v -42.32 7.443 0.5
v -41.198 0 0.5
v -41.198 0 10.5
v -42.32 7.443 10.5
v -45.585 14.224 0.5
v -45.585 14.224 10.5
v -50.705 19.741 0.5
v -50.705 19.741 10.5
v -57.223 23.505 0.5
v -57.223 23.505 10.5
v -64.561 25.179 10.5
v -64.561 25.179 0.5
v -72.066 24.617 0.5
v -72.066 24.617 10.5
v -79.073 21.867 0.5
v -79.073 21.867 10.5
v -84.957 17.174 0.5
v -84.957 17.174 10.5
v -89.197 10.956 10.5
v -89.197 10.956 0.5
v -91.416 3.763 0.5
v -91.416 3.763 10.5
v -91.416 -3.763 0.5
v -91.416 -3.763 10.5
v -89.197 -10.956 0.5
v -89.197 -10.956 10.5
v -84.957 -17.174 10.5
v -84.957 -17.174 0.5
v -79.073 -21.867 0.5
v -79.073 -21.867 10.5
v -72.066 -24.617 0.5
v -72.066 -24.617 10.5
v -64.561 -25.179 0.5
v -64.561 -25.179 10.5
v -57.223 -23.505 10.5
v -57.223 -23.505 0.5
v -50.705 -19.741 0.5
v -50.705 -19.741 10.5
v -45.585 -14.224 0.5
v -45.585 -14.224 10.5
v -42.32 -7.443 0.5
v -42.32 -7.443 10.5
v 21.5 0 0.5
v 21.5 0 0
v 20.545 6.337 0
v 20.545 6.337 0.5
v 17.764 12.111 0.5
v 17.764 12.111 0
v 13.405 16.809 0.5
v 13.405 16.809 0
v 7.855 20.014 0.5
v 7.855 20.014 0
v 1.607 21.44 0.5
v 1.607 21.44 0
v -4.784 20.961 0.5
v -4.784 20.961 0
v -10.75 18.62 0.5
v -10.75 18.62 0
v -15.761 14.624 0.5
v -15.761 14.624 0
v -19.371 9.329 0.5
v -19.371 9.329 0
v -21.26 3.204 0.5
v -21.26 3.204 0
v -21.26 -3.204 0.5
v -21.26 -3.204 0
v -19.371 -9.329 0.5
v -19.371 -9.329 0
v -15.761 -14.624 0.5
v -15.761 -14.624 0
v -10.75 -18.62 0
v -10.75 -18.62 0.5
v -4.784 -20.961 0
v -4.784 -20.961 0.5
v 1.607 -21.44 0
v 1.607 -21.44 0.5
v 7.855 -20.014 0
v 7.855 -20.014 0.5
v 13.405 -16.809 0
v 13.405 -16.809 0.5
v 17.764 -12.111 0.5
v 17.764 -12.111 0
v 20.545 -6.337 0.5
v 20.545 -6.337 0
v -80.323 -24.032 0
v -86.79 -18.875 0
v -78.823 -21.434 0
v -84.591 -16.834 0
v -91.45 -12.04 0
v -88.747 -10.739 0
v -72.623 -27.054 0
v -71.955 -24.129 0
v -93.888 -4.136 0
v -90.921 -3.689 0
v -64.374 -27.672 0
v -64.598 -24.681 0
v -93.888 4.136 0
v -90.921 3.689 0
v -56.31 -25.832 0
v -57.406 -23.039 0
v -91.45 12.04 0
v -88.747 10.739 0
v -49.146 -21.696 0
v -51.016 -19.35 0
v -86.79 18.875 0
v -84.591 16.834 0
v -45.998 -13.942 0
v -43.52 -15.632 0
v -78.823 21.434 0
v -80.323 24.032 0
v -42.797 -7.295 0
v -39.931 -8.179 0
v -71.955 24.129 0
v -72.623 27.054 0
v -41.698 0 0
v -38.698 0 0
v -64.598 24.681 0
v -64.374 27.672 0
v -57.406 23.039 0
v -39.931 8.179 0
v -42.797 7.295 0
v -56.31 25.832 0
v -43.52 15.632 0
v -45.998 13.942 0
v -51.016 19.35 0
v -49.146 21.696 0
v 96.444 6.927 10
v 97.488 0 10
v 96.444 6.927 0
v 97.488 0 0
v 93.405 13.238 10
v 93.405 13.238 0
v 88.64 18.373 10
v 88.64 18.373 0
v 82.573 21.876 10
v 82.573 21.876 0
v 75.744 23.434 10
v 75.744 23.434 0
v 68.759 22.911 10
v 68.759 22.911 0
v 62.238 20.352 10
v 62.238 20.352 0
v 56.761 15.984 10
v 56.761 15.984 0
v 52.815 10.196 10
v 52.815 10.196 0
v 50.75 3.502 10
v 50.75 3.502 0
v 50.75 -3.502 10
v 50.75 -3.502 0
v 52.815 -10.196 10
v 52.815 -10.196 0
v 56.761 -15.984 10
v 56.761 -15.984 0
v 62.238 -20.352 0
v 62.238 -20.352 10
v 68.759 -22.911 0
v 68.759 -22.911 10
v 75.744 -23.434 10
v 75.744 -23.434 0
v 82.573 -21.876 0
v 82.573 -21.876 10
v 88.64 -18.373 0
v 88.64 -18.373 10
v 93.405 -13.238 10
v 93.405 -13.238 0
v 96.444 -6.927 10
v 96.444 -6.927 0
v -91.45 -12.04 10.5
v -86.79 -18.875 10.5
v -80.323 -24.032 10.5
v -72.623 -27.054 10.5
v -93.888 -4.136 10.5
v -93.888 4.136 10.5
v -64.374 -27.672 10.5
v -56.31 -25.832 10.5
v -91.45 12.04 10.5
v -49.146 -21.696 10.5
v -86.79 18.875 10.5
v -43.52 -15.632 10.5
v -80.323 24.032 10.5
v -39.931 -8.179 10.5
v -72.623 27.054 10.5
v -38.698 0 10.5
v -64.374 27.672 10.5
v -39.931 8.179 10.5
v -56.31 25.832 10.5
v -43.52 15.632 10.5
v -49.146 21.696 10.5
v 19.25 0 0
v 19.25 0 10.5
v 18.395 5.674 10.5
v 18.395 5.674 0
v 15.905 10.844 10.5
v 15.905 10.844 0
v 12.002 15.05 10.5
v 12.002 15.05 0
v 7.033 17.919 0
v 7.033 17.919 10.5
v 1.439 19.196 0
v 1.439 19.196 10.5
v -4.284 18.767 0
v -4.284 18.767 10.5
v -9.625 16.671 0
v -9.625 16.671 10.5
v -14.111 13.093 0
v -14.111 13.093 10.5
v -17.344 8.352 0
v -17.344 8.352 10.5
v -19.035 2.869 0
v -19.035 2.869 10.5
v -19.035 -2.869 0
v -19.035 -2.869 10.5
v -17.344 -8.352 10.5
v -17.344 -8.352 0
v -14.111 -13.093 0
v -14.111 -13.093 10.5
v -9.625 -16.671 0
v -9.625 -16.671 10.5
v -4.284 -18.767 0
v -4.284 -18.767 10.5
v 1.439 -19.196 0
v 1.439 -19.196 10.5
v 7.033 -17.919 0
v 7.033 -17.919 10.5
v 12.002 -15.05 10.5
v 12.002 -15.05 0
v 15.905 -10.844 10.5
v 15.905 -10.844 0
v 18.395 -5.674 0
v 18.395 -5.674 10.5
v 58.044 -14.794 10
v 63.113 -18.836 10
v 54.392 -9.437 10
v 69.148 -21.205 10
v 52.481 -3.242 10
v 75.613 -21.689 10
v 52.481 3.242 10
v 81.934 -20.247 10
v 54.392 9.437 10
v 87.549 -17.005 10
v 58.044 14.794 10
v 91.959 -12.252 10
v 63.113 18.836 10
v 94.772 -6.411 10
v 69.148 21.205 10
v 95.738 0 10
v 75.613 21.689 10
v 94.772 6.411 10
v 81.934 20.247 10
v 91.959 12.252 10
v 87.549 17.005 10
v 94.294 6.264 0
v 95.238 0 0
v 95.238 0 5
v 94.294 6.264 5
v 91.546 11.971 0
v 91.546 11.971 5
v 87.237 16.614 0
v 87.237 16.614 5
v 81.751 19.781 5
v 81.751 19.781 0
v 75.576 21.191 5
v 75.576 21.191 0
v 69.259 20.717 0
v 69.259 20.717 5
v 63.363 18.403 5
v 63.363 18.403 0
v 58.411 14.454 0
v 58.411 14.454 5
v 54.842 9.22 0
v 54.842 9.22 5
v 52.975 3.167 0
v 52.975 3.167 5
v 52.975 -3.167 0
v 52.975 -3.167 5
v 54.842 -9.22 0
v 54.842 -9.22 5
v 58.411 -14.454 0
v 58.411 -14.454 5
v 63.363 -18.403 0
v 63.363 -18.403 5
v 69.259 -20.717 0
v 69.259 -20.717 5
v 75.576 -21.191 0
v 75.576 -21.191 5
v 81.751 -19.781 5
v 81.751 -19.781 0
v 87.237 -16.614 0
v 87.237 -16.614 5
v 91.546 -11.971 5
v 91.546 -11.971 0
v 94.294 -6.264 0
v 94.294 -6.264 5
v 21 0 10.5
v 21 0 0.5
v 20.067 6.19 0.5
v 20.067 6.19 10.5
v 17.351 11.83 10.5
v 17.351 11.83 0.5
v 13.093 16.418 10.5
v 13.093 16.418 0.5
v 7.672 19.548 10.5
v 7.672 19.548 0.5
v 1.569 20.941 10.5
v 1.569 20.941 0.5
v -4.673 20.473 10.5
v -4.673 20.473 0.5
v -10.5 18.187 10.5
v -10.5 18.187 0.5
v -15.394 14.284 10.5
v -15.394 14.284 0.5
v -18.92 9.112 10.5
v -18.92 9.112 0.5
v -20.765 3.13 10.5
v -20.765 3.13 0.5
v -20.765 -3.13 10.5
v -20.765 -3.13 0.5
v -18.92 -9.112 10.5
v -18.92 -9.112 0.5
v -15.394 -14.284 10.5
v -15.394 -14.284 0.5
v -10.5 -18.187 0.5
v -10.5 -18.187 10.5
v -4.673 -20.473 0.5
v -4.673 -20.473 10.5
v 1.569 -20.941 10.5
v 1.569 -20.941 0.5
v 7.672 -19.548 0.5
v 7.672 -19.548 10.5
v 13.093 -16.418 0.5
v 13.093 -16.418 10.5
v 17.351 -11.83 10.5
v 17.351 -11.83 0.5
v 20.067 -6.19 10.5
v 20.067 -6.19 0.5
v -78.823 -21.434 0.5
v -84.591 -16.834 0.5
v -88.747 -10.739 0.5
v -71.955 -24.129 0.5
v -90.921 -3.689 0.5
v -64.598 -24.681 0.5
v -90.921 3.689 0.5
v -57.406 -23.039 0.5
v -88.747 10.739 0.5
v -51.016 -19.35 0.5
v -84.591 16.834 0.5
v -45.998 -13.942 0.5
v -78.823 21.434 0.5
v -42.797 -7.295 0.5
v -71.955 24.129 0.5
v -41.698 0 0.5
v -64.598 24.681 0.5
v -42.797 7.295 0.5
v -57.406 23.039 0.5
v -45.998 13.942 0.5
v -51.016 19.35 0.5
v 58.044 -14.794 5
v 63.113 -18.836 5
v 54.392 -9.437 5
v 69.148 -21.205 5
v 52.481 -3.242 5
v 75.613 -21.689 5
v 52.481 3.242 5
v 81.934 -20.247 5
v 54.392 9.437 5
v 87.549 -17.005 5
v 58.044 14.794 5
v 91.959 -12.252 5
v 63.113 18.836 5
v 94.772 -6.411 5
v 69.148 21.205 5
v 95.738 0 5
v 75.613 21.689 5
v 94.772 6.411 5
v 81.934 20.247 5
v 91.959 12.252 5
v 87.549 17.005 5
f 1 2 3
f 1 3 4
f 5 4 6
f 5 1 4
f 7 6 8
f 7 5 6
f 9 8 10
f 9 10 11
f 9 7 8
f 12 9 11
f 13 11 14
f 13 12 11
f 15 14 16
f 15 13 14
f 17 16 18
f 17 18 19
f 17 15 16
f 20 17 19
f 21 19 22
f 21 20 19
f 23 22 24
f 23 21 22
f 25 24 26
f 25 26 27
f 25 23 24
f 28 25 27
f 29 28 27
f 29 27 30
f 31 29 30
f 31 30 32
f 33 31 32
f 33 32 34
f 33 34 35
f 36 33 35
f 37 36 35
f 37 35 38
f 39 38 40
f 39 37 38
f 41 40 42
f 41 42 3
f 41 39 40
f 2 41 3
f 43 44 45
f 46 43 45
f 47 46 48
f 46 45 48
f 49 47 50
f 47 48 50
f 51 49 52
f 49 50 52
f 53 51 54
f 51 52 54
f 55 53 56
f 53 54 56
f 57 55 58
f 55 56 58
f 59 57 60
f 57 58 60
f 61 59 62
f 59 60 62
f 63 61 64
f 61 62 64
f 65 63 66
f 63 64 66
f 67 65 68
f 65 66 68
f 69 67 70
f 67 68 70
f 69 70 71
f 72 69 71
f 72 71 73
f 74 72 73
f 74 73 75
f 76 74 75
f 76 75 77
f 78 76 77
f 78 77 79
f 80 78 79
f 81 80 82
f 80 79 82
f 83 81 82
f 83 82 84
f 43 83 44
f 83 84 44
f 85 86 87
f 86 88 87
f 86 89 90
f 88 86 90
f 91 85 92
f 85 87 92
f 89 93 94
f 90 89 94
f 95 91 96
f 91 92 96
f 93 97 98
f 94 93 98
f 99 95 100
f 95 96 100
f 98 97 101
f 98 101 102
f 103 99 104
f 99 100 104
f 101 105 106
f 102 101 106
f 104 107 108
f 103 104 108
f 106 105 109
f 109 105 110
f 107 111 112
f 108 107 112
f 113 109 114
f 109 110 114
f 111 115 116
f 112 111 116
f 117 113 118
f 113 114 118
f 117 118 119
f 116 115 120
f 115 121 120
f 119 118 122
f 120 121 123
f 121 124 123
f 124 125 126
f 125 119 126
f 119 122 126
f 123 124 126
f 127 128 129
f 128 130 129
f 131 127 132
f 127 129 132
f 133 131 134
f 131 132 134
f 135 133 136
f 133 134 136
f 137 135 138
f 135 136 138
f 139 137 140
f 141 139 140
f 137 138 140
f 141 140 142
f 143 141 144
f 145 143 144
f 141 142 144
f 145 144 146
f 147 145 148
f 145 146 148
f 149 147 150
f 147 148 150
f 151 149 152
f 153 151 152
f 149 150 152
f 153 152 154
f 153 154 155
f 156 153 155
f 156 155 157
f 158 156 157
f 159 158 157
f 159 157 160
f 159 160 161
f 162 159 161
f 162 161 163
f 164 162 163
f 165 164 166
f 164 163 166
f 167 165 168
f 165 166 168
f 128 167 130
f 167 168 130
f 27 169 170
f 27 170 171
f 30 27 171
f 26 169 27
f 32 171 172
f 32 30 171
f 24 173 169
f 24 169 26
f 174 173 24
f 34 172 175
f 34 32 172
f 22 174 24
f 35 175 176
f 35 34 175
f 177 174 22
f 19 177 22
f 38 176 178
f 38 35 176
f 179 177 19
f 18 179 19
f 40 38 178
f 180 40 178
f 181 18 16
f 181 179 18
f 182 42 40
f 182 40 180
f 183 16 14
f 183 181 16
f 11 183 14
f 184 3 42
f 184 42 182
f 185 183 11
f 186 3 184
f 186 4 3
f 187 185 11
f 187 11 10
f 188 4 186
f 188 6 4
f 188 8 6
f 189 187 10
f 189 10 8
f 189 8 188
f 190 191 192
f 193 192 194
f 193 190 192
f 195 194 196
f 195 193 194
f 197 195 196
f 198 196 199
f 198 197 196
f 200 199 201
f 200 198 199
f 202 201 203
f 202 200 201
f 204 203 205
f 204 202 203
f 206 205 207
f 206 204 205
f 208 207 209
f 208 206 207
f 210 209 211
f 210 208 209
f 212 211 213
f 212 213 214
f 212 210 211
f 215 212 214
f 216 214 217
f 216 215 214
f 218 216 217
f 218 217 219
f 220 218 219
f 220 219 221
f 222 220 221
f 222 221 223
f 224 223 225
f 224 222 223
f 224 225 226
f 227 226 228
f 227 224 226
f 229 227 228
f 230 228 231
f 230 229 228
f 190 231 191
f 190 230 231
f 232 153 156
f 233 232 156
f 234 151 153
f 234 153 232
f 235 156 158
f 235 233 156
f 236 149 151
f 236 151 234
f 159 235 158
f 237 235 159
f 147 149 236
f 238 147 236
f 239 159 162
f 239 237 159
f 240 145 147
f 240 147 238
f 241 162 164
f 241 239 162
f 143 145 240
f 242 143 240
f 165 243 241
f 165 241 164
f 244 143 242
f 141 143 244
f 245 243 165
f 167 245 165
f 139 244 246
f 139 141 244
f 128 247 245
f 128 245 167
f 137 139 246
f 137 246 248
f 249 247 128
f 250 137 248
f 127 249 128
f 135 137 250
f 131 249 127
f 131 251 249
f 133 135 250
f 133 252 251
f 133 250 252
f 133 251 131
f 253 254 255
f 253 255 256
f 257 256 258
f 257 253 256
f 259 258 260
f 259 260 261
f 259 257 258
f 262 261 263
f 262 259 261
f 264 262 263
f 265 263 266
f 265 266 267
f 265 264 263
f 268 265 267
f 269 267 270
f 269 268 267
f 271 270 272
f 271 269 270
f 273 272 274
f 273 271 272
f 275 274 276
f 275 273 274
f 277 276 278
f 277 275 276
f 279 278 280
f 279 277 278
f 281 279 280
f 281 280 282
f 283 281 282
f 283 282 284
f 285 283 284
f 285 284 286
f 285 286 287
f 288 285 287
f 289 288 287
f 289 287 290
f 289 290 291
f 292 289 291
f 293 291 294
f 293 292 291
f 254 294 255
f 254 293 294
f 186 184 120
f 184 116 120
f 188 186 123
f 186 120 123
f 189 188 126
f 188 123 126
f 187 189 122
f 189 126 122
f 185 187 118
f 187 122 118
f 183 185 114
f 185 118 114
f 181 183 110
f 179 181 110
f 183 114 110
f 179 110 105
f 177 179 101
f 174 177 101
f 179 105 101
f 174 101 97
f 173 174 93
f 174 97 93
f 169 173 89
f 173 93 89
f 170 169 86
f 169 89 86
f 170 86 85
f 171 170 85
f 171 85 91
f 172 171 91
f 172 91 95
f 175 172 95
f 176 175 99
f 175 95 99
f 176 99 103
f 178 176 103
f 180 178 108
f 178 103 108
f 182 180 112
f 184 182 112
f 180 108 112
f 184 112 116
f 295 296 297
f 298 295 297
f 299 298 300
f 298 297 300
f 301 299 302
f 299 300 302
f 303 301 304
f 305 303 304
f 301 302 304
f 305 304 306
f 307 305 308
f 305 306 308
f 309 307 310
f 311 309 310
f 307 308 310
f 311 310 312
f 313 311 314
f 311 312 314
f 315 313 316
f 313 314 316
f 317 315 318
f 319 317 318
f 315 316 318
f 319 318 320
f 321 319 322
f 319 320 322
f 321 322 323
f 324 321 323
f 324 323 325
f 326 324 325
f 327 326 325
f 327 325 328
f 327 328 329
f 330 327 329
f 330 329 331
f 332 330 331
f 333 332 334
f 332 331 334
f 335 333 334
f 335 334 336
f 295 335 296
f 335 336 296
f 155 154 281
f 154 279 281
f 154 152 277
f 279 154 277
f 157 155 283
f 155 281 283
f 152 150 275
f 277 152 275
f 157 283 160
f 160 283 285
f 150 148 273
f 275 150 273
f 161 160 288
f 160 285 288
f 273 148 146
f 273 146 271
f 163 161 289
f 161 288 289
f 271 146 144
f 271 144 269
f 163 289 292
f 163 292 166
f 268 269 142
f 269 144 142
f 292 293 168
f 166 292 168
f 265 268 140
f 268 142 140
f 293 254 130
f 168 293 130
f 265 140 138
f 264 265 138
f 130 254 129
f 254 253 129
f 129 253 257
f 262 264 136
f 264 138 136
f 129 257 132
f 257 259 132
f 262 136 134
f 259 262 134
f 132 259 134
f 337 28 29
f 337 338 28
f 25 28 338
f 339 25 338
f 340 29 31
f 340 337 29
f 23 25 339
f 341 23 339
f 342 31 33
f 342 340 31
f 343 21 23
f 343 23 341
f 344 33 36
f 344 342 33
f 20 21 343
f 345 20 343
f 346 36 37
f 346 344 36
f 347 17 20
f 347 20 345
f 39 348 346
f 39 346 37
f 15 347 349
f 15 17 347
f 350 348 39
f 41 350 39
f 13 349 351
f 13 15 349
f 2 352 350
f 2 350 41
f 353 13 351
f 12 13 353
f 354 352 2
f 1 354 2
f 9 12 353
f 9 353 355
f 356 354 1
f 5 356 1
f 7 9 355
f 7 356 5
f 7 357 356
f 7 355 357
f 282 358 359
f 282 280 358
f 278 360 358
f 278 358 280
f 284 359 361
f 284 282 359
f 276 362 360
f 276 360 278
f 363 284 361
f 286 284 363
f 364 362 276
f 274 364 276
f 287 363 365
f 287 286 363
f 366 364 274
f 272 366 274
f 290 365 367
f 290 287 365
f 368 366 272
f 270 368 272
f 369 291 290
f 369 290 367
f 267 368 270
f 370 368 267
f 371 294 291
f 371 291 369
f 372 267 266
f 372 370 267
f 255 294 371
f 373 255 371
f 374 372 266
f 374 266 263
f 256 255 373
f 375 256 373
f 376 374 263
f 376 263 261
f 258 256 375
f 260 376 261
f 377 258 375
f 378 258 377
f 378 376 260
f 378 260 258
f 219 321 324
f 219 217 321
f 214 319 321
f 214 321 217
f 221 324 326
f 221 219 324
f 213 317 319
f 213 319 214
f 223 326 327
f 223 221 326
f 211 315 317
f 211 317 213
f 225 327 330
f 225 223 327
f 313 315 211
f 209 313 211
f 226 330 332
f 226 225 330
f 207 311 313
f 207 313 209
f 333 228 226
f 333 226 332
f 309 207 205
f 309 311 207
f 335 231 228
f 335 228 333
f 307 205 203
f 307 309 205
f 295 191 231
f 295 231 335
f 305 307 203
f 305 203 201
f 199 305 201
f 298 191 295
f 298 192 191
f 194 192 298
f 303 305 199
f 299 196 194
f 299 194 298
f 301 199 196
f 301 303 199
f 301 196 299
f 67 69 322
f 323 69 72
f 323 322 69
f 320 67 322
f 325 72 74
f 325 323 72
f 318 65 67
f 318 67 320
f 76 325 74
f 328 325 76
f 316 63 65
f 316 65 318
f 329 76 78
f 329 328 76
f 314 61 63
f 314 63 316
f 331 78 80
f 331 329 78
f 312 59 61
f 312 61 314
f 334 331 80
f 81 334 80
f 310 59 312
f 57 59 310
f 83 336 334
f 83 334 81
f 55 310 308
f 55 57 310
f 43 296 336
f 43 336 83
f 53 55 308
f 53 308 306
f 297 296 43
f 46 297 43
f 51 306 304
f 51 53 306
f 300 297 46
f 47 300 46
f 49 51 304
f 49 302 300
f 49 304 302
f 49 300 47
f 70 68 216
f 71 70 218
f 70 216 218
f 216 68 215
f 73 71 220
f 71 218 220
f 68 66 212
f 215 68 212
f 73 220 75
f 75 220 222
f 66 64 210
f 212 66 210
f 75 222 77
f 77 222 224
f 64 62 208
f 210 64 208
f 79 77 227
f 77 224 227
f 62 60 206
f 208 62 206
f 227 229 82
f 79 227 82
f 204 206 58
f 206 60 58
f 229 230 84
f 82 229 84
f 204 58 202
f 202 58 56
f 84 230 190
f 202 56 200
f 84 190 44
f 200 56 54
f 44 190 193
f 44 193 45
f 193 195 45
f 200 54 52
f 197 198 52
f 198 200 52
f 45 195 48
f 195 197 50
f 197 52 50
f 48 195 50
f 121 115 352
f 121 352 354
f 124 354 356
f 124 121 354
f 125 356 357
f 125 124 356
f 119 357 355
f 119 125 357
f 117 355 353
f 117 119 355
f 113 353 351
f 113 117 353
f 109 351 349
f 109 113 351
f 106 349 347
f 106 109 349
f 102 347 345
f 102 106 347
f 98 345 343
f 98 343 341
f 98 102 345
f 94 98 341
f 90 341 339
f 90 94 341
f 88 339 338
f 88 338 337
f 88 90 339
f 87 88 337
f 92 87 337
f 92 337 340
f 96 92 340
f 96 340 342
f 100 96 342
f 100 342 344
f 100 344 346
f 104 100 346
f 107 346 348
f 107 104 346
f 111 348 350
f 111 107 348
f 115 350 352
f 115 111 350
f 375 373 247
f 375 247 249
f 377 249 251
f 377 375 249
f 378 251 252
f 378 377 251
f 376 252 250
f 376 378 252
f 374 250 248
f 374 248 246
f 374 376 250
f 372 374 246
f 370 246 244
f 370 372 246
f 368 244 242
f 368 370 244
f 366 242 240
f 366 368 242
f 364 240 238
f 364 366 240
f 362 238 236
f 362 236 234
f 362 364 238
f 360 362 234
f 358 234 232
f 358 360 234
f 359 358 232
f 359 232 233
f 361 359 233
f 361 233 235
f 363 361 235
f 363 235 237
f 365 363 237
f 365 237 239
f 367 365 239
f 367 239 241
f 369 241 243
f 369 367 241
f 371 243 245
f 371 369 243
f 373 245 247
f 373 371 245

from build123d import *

# Parameters (mm, degrees)
F0_R      = 21.5
F0_R_2    = 19.25
F1_DEPTH  = 0.5
F2_R      = 21
F2_R_2    = 19.25
F3_DEPTH  = 10
F4_R      = 23.5
F4_R_2    = 21.25
F5_DEPTH  = 5
F6_R      = 23.5
F6_R_2    = 21.75
F7_DEPTH  = 5
F8_R      = 27.75
F8_R_2    = 24.75
F9_DEPTH  = 0.5
F10_R     = 27.75
F10_R_2   = 25.25
F11_DEPTH = 10


with BuildPart() as f1:
    # F0 (on Top) → F1 (new body)
    with BuildSketch(Plane.XY):
        Circle(F0_R)
        Circle(F0_R_2, mode=Mode.SUBTRACT)
    extrude(amount=F1_DEPTH)

    # F2 (on face) → F3 (join)
    with BuildSketch(Plane.XY.offset(0.5)):
        Circle(F2_R)
        Circle(F2_R_2, mode=Mode.SUBTRACT)
    extrude(amount=F3_DEPTH)


with BuildPart() as f5:
    # F4 (on Top) → F5 (new body)
    with BuildSketch(Plane.XY):
        with Locations((73.987961, 0)):
            Circle(F4_R)
        with Locations((73.987961, 0)):
            Circle(F4_R_2, mode=Mode.SUBTRACT)
    extrude(amount=F5_DEPTH)

    # F6 (on face) → F7 (join)
    with BuildSketch(Plane.XY.offset(5)):
        with Locations((73.987961, 0)):
            Circle(F6_R)
        with Locations((73.987961, 0)):
            Circle(F6_R_2, mode=Mode.SUBTRACT)
    extrude(amount=F7_DEPTH)


with BuildPart() as f9:
    # F8 (on Top) → F9 (new body)
    with BuildSketch(Plane.XY):
        with Locations((-66.447794, 0)):
            Circle(F8_R)
        with Locations((-66.447794, 0)):
            Circle(F8_R_2, mode=Mode.SUBTRACT)
    extrude(amount=F9_DEPTH)

    # F10 (on face) → F11 (join)
    with BuildSketch(Plane.XY.offset(0.5)):
        with Locations((-66.447794, 0)):
            Circle(F10_R)
        with Locations((-66.447794, 0)):
            Circle(F10_R_2, mode=Mode.SUBTRACT)
    extrude(amount=F11_DEPTH)


solid = Compound([f1.part, f5.part, f9.part])
